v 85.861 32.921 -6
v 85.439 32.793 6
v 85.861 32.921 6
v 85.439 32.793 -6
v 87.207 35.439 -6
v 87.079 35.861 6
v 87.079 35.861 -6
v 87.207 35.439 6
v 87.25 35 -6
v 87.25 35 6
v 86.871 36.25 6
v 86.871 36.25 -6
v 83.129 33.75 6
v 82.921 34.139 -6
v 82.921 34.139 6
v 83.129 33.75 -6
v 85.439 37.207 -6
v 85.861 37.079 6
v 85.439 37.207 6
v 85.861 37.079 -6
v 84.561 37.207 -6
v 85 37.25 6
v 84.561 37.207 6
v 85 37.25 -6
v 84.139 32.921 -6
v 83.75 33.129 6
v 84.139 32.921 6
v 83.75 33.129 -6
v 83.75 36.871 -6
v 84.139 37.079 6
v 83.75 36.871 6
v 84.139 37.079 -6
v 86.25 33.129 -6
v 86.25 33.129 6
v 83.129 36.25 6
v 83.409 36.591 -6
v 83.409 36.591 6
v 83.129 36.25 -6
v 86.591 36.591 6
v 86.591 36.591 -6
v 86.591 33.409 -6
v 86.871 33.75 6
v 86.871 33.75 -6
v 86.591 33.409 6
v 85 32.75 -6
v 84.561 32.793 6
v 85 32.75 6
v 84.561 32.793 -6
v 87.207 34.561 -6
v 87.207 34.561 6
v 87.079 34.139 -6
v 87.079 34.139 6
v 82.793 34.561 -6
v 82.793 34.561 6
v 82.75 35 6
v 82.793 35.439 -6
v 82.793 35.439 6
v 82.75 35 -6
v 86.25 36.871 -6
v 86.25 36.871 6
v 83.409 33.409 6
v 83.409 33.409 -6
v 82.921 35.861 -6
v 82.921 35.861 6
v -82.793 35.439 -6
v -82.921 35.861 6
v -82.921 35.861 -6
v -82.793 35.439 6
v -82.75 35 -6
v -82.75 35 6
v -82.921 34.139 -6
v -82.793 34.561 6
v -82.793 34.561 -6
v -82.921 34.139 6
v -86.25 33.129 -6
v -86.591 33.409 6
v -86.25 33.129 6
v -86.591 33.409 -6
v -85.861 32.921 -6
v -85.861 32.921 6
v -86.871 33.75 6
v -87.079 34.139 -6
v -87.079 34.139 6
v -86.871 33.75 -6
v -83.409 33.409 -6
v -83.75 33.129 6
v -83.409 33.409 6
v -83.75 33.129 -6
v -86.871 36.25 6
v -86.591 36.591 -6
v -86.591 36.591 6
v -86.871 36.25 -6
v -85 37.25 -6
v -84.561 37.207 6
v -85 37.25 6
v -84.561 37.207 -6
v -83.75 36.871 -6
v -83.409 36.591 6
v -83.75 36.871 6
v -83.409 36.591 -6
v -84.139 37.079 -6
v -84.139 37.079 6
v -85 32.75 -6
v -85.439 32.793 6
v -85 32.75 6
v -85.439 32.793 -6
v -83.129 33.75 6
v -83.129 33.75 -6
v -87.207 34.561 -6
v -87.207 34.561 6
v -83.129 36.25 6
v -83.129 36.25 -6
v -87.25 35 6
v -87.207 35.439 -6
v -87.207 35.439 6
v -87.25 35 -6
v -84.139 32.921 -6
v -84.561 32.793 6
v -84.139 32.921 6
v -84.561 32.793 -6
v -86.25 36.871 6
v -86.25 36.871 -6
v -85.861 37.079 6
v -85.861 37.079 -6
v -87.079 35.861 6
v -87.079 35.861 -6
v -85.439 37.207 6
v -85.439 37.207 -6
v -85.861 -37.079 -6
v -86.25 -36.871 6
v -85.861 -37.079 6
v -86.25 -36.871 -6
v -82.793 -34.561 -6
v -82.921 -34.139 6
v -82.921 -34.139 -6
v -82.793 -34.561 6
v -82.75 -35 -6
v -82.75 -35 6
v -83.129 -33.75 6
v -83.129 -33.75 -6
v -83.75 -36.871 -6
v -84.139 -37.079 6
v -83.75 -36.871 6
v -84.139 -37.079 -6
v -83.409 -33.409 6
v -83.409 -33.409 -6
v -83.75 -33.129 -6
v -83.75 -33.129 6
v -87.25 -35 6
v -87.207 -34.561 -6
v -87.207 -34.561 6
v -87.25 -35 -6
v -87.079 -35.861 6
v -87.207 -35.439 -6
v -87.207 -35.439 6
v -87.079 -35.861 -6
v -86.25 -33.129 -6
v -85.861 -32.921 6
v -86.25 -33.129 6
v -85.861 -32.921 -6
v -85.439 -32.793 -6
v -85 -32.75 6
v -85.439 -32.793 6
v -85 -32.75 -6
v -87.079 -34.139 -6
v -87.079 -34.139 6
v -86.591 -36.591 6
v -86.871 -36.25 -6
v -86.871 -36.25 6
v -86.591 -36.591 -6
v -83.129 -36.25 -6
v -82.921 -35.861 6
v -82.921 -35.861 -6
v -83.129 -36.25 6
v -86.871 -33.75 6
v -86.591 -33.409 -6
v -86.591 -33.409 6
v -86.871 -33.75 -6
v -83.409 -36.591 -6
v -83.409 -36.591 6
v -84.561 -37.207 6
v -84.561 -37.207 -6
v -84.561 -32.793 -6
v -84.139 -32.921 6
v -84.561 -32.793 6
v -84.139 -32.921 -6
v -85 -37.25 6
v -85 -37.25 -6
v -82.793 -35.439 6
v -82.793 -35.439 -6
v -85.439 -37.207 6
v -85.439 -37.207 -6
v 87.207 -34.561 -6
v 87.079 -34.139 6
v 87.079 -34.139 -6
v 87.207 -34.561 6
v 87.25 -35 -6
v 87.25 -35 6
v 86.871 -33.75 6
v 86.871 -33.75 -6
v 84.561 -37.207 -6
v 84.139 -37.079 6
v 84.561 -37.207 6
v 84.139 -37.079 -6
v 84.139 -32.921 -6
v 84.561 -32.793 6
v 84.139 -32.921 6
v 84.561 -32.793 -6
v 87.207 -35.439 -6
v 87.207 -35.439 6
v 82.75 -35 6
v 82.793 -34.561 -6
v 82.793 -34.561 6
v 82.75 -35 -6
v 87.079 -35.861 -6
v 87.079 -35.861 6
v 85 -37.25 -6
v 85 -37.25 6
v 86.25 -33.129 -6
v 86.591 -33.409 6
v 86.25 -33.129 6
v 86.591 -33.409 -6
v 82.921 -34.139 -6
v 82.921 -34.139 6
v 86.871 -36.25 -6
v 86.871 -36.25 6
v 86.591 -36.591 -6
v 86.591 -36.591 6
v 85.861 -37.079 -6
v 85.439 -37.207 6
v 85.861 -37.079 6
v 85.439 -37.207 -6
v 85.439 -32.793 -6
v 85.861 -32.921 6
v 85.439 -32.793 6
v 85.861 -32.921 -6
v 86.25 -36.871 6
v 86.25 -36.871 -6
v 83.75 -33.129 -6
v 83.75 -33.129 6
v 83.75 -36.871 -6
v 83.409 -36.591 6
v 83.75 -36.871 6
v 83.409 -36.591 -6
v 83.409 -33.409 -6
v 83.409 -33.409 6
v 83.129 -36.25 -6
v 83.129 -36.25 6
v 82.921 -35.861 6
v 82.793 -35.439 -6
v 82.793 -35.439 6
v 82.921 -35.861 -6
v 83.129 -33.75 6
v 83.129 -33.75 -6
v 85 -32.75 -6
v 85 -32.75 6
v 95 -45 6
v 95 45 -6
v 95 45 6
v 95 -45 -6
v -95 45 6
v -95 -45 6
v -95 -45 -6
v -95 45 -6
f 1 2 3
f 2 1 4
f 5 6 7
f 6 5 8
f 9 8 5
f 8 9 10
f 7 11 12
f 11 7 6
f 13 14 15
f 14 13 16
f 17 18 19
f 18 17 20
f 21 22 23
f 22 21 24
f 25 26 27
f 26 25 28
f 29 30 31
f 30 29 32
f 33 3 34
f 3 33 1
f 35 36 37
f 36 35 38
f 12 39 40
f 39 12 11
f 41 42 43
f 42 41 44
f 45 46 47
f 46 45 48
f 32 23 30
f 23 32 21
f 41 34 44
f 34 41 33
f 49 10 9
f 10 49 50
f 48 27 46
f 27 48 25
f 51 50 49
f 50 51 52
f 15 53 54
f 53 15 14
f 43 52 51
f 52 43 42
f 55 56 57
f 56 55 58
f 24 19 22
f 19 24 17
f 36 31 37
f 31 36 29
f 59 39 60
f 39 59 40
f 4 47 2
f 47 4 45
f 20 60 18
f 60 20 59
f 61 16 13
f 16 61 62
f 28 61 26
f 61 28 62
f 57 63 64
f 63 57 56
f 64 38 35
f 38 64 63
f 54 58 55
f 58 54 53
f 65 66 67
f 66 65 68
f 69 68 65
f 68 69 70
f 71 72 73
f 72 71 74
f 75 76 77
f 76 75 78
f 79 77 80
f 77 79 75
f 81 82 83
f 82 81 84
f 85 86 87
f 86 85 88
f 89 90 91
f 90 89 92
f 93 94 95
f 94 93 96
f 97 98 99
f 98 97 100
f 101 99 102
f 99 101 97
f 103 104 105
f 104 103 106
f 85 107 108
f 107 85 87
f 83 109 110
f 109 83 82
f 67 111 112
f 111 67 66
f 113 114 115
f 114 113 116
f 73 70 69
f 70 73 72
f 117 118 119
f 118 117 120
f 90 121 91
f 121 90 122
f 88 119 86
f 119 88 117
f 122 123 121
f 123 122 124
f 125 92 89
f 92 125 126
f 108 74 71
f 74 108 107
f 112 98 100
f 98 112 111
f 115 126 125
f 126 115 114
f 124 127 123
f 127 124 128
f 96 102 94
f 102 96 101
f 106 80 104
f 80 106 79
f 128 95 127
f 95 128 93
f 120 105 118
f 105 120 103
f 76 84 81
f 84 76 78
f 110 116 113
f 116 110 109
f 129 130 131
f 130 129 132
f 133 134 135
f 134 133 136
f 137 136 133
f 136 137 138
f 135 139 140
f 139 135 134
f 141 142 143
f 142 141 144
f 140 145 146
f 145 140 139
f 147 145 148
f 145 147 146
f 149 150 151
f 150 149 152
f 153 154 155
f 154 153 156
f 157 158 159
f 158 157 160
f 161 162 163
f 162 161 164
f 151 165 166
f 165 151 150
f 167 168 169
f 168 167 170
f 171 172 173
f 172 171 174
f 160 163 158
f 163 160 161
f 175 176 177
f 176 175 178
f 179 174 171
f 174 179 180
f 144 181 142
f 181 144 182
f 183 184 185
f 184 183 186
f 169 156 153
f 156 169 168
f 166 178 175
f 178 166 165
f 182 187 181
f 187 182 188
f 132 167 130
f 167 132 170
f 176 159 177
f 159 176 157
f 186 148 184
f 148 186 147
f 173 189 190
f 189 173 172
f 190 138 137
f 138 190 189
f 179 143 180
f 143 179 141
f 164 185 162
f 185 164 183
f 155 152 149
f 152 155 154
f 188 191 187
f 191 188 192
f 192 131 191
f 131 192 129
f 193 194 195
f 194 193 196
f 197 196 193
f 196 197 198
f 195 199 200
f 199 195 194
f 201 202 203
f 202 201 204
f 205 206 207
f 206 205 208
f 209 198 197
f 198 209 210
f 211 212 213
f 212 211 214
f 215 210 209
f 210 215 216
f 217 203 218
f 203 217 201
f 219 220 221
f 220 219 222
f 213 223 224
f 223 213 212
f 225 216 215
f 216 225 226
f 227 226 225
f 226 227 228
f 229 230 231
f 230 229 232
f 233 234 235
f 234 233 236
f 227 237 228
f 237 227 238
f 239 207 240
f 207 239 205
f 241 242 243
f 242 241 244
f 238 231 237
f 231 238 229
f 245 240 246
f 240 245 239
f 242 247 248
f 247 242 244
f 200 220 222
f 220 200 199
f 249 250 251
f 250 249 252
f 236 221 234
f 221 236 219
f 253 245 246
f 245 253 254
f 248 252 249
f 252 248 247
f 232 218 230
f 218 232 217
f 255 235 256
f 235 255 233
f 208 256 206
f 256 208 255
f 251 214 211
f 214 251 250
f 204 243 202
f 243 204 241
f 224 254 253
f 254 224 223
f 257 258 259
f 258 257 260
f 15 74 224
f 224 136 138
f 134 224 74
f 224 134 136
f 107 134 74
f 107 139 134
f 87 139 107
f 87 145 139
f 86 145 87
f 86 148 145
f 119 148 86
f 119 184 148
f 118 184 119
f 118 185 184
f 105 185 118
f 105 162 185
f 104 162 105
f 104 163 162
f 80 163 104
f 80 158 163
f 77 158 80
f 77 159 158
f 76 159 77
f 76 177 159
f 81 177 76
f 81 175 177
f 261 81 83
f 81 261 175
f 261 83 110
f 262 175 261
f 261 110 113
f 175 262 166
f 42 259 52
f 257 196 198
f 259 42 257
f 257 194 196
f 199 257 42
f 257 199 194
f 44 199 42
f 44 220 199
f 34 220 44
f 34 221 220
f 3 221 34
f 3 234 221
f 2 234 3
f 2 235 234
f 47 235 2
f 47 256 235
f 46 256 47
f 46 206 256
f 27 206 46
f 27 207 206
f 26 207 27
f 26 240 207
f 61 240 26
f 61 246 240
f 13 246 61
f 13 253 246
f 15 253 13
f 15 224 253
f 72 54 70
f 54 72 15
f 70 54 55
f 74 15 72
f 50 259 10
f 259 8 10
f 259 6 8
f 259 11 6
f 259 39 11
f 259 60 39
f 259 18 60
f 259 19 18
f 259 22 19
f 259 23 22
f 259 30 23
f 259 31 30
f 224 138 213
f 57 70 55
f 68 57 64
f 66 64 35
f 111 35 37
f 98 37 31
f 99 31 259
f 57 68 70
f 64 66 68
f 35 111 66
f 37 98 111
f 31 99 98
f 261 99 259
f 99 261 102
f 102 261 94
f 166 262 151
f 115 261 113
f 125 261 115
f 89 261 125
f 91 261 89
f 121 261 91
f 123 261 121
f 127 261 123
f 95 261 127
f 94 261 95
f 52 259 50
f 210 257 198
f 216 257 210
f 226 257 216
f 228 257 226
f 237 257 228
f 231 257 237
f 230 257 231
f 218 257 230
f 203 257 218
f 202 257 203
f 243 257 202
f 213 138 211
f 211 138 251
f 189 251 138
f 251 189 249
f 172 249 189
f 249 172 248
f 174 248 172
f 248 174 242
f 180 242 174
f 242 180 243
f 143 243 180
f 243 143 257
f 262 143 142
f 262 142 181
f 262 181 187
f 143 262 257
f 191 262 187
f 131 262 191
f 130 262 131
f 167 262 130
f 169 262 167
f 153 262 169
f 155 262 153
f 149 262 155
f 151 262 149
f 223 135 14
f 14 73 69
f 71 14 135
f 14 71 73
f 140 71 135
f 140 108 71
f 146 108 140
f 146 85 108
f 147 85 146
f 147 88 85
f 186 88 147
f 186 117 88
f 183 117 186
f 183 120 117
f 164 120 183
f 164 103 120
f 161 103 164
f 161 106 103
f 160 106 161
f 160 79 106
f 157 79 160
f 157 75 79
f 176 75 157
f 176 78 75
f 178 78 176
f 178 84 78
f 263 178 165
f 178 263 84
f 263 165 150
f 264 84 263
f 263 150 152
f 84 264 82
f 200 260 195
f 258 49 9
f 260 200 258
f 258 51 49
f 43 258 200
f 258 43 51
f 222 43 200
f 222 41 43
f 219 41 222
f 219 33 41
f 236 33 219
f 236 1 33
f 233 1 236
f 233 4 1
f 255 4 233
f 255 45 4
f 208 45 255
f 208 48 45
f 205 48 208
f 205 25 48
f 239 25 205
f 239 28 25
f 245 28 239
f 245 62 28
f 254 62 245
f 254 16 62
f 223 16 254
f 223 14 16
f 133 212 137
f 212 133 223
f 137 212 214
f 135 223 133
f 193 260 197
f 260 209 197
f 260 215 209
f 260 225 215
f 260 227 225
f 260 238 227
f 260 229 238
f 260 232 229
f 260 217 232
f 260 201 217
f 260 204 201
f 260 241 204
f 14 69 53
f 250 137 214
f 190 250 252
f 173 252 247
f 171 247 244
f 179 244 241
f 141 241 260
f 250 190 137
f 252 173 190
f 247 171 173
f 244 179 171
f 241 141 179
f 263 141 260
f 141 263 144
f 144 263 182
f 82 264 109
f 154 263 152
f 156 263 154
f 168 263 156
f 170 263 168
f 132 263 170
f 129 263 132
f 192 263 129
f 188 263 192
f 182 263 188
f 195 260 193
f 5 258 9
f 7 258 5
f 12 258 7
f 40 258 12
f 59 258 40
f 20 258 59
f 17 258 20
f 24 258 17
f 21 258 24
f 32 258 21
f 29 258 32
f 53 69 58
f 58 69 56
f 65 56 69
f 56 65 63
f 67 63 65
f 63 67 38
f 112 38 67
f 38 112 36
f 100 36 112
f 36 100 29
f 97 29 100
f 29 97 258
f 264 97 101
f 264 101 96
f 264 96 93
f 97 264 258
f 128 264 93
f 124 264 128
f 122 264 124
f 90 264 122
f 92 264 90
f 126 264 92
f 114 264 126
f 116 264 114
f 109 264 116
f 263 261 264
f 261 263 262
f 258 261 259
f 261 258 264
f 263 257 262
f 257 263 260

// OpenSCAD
$fn = 32;

// ----------------------------------------------------------------------
// Corner plate 190 x 90 x 12
// 4 holes, centres taken from the edge offset
// ----------------------------------------------------------------------

// --- parameters (mm) ---
plate = [190, 90, 12];  // overall size (x, y, z)
holes = 4;              // number of holes the drawing asks for
hole_d = 4.5;           // hole diameter
edge = 10;              // hole centre offset from the plate edge

// --- derived feature positions (mm) ---
corner_x = plate[0] / 2 - edge;  // = 85   corner hole X
corner_y = plate[1] / 2 - edge;  // = 35   corner hole Y
feature_centers = [
  [corner_x, corner_y],
  [-corner_x, corner_y],
  [-corner_x, -corner_y],
  [corner_x, -corner_y]
];   // hole centres the loop below drills

// plate outline, every hole drilled through with the same cutters
difference() {
  cube(plate, center = true);
  for (centre = feature_centers)
    translate([centre[0], centre[1], 0])
      cylinder(d = hole_d, h = plate[2] + 2, center = true);
}
